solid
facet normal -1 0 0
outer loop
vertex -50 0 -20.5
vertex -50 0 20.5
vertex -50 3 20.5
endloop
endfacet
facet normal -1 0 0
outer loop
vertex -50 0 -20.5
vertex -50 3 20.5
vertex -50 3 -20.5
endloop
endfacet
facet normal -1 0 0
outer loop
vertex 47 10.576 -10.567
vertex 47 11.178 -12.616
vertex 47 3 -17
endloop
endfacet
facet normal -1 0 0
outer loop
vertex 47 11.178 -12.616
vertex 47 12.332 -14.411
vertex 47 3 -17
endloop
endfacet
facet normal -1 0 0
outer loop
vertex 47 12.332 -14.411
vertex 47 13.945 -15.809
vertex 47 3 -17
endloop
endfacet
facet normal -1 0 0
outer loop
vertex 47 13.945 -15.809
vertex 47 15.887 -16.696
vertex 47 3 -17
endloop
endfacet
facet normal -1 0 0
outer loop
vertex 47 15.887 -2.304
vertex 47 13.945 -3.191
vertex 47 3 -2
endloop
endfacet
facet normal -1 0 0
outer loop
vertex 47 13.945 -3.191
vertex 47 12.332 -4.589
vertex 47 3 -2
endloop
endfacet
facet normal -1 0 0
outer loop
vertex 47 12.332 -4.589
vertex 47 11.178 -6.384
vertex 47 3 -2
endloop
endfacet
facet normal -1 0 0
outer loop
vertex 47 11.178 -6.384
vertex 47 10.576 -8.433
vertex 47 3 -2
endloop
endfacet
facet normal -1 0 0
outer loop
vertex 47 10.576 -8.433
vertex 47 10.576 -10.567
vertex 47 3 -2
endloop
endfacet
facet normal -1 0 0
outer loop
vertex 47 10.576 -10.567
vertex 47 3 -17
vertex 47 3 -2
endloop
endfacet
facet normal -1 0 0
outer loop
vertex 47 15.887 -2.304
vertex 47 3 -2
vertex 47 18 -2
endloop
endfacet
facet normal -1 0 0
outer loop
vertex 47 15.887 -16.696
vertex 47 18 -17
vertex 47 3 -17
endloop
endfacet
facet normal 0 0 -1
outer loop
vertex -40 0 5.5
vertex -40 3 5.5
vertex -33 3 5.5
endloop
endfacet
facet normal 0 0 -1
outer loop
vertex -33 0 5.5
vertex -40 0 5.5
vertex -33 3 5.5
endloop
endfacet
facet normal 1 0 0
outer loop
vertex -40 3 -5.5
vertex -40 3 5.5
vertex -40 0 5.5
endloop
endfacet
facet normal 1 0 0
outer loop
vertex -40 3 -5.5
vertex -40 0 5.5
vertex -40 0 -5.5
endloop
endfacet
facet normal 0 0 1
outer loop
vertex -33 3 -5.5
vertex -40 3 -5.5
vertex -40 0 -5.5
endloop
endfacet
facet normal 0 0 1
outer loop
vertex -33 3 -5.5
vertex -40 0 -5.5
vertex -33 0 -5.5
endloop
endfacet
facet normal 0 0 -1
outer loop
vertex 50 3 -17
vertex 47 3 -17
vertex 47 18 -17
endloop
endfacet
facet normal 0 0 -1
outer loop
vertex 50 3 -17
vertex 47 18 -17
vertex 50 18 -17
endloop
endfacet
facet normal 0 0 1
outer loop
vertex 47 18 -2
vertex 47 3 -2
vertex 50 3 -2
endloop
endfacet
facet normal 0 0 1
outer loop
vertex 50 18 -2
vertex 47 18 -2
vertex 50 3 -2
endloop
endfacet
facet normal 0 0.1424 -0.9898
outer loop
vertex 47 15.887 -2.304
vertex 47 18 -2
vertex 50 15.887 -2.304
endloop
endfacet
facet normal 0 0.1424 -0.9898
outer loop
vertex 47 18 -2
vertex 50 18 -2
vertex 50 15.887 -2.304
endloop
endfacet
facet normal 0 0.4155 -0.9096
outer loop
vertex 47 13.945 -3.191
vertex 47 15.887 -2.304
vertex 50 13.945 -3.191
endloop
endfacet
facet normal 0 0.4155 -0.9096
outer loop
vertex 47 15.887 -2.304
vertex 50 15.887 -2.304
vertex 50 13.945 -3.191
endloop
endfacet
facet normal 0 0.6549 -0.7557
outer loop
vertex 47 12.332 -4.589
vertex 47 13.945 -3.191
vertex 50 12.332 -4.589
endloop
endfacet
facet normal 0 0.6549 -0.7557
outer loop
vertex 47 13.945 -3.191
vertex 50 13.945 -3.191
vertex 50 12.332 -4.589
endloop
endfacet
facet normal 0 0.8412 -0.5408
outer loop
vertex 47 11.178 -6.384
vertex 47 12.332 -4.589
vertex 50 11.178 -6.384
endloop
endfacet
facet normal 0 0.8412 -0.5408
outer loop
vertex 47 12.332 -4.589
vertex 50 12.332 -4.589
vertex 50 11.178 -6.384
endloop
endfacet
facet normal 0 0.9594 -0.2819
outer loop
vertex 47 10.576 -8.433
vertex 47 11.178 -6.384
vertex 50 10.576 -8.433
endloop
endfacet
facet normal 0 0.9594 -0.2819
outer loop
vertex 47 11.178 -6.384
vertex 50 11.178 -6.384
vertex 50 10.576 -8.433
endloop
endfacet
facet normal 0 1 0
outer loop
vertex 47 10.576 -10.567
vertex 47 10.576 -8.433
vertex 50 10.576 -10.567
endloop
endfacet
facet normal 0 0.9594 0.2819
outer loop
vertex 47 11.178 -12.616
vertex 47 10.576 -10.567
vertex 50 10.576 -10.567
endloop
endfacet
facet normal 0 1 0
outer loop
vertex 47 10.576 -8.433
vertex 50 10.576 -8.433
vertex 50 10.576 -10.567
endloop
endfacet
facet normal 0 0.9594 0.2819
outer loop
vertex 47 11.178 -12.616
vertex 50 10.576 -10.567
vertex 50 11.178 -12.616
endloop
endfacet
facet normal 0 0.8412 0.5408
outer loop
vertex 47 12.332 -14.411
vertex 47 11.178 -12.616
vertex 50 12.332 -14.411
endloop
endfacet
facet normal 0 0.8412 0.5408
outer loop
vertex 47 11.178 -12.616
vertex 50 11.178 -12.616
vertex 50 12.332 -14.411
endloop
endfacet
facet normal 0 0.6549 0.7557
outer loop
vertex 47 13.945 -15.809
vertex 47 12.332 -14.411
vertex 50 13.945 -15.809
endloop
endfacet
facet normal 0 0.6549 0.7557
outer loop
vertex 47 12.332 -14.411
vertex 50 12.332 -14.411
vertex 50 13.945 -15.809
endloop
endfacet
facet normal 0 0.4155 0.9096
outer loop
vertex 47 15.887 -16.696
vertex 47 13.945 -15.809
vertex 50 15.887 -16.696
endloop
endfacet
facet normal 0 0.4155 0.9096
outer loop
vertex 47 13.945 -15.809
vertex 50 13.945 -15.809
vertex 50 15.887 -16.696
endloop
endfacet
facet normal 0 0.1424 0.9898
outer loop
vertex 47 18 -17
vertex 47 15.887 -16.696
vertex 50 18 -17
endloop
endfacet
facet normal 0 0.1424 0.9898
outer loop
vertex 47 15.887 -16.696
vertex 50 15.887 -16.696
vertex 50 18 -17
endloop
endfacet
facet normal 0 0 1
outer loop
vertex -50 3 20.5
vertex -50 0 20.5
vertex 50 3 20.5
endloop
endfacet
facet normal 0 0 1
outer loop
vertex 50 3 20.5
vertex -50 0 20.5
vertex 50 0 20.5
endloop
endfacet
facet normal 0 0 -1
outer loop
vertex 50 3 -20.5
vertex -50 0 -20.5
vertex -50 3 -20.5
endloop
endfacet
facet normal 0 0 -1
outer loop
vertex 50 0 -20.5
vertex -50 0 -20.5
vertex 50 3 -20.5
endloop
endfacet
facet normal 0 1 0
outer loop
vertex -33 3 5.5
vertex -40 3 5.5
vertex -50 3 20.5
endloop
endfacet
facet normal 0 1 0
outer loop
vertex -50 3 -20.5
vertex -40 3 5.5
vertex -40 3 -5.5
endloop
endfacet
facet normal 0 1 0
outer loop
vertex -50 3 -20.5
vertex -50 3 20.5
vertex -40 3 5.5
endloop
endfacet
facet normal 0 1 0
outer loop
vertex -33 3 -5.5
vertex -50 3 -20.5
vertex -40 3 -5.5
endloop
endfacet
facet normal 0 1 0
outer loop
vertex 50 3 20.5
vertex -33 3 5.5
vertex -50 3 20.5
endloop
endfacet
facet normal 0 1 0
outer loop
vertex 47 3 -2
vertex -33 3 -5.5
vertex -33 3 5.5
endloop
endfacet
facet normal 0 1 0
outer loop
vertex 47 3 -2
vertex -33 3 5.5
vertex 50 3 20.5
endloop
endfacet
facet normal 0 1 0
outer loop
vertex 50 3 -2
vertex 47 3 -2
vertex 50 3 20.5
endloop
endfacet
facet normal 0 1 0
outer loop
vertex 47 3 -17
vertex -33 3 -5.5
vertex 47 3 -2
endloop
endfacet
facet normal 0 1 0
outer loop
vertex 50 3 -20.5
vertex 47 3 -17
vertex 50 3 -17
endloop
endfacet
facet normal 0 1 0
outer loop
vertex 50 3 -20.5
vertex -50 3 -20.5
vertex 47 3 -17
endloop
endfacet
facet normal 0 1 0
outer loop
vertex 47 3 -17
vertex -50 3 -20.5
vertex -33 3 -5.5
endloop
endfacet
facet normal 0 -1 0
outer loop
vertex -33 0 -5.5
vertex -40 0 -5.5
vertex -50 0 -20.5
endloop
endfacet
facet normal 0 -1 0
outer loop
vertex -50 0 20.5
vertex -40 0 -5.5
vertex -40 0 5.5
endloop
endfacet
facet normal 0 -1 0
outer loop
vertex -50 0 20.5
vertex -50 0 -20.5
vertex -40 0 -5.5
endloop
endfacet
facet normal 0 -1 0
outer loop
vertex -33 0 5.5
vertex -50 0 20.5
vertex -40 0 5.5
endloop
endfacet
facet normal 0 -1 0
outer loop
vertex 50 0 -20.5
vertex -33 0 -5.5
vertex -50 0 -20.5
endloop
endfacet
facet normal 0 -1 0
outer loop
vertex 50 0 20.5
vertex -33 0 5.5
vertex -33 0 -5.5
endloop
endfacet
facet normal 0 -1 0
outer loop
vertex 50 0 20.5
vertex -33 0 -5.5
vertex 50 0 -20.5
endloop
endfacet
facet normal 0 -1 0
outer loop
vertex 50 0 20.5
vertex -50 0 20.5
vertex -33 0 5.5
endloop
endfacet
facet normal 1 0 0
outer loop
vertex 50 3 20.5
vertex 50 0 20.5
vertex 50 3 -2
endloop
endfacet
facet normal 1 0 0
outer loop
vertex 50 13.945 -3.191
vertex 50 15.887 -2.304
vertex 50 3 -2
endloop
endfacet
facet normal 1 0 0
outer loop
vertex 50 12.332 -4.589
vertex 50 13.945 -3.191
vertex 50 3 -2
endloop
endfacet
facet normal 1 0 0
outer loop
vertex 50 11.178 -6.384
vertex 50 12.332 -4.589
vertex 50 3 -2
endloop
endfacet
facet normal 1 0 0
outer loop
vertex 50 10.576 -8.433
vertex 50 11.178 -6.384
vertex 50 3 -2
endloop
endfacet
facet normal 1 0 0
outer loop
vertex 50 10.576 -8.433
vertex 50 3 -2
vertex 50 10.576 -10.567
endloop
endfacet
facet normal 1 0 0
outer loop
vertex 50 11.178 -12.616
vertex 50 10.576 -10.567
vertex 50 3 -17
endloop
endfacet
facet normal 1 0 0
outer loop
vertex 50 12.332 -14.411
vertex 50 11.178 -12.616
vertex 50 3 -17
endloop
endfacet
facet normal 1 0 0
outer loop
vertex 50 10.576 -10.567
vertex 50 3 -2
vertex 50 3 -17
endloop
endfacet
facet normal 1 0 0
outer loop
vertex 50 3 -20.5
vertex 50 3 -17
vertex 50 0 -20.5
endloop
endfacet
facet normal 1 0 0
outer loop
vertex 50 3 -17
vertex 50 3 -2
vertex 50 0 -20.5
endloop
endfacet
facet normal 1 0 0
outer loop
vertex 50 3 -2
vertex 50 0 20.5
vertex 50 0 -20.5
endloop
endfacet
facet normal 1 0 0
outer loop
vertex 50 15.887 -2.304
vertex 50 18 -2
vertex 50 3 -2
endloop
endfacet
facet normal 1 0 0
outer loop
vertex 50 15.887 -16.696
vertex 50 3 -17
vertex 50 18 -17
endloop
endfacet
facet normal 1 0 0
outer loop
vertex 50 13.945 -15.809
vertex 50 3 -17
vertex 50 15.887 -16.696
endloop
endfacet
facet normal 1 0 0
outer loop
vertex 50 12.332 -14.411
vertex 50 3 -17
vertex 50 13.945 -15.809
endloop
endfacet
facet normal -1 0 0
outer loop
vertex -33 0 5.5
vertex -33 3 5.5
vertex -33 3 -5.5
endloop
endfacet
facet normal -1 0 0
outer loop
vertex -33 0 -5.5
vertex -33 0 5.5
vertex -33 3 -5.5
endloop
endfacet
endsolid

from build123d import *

# Parameters (mm, degrees)
ESQUISSE1_W             = 100
ESQUISSE1_H             = 41
BOSS_EXTRU_1_DEPTH      = 3
ESQUISSE2_W             = 7
ESQUISSE2_H             = 11
ENL_V_MAT_EXTRU_2_DEPTH = 3
ESQUISSE3_W             = 3
ESQUISSE3_H             = 15
BOSS_EXTRU_2_DEPTH      = 18
ESQUISSE4_R             = 7.5
ENL_V_MAT_EXTRU_3_DEPTH = 6


with BuildPart() as part:
    # Esquisse1 → Boss.-Extru.1 (new body)
    with BuildSketch(Plane(origin=(0, 0, 0), x_dir=(1, 0, 0), z_dir=(0, 1, 0))):
        Rectangle(ESQUISSE1_W, ESQUISSE1_H)
    extrude(amount=BOSS_EXTRU_1_DEPTH)

    # Esquisse2 → Enlèv. mat.-Extru.2 (cut)
    with BuildSketch(Plane(origin=(0, 3, 0), x_dir=(1, 0, 0), z_dir=(0, 1, 0))):
        with Locations((-36.5, 0)):
            Rectangle(ESQUISSE2_W, ESQUISSE2_H)
    extrude(amount=-ENL_V_MAT_EXTRU_2_DEPTH, mode=Mode.SUBTRACT)

    # Esquisse3 → Boss.-Extru.2 (add)
    with BuildSketch(Plane.XZ):
        with Locations((48.5, -9.5)):
            Rectangle(ESQUISSE3_W, ESQUISSE3_H)
    extrude(amount=-BOSS_EXTRU_2_DEPTH)

    # Esquisse4 → Enlèv. mat.-Extru.3 (cut)
    with BuildSketch(Plane(origin=(50, 0, 0), x_dir=(0, 0, -1), z_dir=(1, 0, 0))):
        with Locations((9.5, 18)):
            Circle(ESQUISSE4_R)
    extrude(amount=-ENL_V_MAT_EXTRU_3_DEPTH, mode=Mode.SUBTRACT)


solid = part.part
